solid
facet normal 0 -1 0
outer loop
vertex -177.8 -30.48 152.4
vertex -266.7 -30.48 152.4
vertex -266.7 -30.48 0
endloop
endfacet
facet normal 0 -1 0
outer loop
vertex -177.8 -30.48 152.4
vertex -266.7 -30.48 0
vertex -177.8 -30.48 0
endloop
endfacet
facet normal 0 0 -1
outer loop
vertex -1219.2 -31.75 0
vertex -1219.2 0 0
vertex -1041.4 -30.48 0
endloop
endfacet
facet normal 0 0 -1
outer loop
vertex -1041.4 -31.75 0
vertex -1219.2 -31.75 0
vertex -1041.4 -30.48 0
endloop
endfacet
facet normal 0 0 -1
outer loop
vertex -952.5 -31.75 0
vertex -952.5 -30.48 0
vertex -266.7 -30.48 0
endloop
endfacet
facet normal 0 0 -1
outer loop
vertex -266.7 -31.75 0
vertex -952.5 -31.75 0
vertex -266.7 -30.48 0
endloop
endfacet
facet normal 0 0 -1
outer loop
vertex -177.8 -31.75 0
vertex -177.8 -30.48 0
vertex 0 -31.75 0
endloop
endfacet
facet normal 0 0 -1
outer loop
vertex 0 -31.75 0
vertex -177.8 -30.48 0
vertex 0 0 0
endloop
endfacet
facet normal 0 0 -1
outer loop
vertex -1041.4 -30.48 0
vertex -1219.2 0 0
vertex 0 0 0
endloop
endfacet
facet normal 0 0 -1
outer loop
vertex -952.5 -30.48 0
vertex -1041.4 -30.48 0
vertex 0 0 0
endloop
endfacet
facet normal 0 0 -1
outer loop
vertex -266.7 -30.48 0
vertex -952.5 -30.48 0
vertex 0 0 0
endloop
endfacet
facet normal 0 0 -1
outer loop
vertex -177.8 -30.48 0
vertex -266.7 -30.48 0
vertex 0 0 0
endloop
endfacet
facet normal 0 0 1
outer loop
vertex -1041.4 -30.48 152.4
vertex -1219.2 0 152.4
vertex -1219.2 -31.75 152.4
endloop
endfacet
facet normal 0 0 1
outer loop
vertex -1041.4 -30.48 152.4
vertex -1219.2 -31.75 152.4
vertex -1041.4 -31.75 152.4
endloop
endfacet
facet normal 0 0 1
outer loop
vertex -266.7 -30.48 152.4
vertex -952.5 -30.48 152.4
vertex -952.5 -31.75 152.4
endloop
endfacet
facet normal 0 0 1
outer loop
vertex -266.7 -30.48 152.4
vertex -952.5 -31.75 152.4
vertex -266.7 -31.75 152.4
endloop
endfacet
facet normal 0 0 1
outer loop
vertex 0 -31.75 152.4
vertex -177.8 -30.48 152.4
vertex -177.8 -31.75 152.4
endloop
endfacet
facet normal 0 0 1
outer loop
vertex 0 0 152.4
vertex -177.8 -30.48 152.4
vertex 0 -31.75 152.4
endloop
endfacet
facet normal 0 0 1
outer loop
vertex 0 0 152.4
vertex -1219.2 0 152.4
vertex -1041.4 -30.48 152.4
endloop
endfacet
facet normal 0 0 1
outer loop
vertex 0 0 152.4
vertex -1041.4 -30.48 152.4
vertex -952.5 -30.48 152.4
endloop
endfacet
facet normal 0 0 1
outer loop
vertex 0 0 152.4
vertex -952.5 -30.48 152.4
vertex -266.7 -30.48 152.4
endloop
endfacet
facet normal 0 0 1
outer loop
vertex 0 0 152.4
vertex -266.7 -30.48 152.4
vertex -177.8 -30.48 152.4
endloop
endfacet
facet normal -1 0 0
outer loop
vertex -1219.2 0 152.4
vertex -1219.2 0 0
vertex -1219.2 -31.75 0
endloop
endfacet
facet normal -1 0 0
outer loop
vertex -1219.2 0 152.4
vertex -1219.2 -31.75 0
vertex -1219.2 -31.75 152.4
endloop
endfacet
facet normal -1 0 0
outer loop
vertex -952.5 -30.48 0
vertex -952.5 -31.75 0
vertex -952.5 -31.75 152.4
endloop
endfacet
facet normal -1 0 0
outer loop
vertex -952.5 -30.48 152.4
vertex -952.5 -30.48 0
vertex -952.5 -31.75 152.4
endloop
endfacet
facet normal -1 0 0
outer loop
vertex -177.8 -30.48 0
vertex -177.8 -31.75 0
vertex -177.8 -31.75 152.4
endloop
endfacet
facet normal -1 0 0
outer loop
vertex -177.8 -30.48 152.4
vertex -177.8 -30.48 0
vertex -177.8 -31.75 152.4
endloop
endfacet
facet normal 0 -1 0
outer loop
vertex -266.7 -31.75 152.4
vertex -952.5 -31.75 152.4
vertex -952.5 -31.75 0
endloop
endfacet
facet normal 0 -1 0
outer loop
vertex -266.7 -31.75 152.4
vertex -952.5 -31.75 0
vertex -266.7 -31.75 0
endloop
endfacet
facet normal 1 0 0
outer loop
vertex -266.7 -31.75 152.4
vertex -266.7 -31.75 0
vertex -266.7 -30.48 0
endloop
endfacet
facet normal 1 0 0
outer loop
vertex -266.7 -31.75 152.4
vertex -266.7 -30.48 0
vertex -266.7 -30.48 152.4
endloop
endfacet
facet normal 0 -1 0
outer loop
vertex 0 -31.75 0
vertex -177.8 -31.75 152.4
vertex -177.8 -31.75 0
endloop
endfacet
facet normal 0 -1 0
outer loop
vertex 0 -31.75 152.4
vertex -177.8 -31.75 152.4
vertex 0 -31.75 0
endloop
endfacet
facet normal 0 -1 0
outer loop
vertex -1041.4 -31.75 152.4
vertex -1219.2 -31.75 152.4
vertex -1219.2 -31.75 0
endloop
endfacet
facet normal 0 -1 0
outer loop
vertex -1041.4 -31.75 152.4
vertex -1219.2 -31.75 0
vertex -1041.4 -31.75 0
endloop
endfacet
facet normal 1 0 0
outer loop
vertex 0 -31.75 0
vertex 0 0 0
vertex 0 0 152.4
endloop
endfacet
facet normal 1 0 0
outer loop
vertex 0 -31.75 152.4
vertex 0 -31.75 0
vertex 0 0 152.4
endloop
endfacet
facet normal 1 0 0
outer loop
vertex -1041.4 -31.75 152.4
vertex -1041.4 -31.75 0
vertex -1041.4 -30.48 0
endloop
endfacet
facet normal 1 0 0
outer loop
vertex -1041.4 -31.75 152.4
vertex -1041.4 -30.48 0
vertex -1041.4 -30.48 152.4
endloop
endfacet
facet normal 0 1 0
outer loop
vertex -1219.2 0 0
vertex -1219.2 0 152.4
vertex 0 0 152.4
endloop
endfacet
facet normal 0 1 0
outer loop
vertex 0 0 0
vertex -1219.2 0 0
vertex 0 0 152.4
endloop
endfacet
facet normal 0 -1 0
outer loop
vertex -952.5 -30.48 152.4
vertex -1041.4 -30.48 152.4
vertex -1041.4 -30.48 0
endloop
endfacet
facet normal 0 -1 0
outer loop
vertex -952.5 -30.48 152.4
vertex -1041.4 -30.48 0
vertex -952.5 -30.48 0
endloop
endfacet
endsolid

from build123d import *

# Parameters (mm, degrees)
F0_W     = 1219.2
F0_H     = 152.4
F1_DEPTH = 31.75
F2_W     = 88.9
F2_H     = 152.4
F3_DEPTH = 1.27
F4_DEPTH = 1.27


with BuildPart() as f1:
    # F0 (on Front) → F1 (new body)
    with BuildSketch(Plane.XZ):
        with Locations((-609.6, 76.2)):
            Rectangle(F0_W, F0_H)
    extrude(amount=F1_DEPTH)

    # F2 (on face) → F3 (cut)
    with BuildSketch(Plane.XZ.offset(31.75)):
        with Locations((-996.95, 76.2)):
            Rectangle(F2_W, F2_H)
    extrude(amount=-F3_DEPTH, mode=Mode.SUBTRACT)

    # F2 (on face) → F4 (cut)
    with BuildSketch(Plane.XZ.offset(31.75)):
        with Locations((-222.25, 76.2)):
            Rectangle(F2_W, F2_H)
    extrude(amount=-F4_DEPTH, mode=Mode.SUBTRACT)


solid = f1.part
